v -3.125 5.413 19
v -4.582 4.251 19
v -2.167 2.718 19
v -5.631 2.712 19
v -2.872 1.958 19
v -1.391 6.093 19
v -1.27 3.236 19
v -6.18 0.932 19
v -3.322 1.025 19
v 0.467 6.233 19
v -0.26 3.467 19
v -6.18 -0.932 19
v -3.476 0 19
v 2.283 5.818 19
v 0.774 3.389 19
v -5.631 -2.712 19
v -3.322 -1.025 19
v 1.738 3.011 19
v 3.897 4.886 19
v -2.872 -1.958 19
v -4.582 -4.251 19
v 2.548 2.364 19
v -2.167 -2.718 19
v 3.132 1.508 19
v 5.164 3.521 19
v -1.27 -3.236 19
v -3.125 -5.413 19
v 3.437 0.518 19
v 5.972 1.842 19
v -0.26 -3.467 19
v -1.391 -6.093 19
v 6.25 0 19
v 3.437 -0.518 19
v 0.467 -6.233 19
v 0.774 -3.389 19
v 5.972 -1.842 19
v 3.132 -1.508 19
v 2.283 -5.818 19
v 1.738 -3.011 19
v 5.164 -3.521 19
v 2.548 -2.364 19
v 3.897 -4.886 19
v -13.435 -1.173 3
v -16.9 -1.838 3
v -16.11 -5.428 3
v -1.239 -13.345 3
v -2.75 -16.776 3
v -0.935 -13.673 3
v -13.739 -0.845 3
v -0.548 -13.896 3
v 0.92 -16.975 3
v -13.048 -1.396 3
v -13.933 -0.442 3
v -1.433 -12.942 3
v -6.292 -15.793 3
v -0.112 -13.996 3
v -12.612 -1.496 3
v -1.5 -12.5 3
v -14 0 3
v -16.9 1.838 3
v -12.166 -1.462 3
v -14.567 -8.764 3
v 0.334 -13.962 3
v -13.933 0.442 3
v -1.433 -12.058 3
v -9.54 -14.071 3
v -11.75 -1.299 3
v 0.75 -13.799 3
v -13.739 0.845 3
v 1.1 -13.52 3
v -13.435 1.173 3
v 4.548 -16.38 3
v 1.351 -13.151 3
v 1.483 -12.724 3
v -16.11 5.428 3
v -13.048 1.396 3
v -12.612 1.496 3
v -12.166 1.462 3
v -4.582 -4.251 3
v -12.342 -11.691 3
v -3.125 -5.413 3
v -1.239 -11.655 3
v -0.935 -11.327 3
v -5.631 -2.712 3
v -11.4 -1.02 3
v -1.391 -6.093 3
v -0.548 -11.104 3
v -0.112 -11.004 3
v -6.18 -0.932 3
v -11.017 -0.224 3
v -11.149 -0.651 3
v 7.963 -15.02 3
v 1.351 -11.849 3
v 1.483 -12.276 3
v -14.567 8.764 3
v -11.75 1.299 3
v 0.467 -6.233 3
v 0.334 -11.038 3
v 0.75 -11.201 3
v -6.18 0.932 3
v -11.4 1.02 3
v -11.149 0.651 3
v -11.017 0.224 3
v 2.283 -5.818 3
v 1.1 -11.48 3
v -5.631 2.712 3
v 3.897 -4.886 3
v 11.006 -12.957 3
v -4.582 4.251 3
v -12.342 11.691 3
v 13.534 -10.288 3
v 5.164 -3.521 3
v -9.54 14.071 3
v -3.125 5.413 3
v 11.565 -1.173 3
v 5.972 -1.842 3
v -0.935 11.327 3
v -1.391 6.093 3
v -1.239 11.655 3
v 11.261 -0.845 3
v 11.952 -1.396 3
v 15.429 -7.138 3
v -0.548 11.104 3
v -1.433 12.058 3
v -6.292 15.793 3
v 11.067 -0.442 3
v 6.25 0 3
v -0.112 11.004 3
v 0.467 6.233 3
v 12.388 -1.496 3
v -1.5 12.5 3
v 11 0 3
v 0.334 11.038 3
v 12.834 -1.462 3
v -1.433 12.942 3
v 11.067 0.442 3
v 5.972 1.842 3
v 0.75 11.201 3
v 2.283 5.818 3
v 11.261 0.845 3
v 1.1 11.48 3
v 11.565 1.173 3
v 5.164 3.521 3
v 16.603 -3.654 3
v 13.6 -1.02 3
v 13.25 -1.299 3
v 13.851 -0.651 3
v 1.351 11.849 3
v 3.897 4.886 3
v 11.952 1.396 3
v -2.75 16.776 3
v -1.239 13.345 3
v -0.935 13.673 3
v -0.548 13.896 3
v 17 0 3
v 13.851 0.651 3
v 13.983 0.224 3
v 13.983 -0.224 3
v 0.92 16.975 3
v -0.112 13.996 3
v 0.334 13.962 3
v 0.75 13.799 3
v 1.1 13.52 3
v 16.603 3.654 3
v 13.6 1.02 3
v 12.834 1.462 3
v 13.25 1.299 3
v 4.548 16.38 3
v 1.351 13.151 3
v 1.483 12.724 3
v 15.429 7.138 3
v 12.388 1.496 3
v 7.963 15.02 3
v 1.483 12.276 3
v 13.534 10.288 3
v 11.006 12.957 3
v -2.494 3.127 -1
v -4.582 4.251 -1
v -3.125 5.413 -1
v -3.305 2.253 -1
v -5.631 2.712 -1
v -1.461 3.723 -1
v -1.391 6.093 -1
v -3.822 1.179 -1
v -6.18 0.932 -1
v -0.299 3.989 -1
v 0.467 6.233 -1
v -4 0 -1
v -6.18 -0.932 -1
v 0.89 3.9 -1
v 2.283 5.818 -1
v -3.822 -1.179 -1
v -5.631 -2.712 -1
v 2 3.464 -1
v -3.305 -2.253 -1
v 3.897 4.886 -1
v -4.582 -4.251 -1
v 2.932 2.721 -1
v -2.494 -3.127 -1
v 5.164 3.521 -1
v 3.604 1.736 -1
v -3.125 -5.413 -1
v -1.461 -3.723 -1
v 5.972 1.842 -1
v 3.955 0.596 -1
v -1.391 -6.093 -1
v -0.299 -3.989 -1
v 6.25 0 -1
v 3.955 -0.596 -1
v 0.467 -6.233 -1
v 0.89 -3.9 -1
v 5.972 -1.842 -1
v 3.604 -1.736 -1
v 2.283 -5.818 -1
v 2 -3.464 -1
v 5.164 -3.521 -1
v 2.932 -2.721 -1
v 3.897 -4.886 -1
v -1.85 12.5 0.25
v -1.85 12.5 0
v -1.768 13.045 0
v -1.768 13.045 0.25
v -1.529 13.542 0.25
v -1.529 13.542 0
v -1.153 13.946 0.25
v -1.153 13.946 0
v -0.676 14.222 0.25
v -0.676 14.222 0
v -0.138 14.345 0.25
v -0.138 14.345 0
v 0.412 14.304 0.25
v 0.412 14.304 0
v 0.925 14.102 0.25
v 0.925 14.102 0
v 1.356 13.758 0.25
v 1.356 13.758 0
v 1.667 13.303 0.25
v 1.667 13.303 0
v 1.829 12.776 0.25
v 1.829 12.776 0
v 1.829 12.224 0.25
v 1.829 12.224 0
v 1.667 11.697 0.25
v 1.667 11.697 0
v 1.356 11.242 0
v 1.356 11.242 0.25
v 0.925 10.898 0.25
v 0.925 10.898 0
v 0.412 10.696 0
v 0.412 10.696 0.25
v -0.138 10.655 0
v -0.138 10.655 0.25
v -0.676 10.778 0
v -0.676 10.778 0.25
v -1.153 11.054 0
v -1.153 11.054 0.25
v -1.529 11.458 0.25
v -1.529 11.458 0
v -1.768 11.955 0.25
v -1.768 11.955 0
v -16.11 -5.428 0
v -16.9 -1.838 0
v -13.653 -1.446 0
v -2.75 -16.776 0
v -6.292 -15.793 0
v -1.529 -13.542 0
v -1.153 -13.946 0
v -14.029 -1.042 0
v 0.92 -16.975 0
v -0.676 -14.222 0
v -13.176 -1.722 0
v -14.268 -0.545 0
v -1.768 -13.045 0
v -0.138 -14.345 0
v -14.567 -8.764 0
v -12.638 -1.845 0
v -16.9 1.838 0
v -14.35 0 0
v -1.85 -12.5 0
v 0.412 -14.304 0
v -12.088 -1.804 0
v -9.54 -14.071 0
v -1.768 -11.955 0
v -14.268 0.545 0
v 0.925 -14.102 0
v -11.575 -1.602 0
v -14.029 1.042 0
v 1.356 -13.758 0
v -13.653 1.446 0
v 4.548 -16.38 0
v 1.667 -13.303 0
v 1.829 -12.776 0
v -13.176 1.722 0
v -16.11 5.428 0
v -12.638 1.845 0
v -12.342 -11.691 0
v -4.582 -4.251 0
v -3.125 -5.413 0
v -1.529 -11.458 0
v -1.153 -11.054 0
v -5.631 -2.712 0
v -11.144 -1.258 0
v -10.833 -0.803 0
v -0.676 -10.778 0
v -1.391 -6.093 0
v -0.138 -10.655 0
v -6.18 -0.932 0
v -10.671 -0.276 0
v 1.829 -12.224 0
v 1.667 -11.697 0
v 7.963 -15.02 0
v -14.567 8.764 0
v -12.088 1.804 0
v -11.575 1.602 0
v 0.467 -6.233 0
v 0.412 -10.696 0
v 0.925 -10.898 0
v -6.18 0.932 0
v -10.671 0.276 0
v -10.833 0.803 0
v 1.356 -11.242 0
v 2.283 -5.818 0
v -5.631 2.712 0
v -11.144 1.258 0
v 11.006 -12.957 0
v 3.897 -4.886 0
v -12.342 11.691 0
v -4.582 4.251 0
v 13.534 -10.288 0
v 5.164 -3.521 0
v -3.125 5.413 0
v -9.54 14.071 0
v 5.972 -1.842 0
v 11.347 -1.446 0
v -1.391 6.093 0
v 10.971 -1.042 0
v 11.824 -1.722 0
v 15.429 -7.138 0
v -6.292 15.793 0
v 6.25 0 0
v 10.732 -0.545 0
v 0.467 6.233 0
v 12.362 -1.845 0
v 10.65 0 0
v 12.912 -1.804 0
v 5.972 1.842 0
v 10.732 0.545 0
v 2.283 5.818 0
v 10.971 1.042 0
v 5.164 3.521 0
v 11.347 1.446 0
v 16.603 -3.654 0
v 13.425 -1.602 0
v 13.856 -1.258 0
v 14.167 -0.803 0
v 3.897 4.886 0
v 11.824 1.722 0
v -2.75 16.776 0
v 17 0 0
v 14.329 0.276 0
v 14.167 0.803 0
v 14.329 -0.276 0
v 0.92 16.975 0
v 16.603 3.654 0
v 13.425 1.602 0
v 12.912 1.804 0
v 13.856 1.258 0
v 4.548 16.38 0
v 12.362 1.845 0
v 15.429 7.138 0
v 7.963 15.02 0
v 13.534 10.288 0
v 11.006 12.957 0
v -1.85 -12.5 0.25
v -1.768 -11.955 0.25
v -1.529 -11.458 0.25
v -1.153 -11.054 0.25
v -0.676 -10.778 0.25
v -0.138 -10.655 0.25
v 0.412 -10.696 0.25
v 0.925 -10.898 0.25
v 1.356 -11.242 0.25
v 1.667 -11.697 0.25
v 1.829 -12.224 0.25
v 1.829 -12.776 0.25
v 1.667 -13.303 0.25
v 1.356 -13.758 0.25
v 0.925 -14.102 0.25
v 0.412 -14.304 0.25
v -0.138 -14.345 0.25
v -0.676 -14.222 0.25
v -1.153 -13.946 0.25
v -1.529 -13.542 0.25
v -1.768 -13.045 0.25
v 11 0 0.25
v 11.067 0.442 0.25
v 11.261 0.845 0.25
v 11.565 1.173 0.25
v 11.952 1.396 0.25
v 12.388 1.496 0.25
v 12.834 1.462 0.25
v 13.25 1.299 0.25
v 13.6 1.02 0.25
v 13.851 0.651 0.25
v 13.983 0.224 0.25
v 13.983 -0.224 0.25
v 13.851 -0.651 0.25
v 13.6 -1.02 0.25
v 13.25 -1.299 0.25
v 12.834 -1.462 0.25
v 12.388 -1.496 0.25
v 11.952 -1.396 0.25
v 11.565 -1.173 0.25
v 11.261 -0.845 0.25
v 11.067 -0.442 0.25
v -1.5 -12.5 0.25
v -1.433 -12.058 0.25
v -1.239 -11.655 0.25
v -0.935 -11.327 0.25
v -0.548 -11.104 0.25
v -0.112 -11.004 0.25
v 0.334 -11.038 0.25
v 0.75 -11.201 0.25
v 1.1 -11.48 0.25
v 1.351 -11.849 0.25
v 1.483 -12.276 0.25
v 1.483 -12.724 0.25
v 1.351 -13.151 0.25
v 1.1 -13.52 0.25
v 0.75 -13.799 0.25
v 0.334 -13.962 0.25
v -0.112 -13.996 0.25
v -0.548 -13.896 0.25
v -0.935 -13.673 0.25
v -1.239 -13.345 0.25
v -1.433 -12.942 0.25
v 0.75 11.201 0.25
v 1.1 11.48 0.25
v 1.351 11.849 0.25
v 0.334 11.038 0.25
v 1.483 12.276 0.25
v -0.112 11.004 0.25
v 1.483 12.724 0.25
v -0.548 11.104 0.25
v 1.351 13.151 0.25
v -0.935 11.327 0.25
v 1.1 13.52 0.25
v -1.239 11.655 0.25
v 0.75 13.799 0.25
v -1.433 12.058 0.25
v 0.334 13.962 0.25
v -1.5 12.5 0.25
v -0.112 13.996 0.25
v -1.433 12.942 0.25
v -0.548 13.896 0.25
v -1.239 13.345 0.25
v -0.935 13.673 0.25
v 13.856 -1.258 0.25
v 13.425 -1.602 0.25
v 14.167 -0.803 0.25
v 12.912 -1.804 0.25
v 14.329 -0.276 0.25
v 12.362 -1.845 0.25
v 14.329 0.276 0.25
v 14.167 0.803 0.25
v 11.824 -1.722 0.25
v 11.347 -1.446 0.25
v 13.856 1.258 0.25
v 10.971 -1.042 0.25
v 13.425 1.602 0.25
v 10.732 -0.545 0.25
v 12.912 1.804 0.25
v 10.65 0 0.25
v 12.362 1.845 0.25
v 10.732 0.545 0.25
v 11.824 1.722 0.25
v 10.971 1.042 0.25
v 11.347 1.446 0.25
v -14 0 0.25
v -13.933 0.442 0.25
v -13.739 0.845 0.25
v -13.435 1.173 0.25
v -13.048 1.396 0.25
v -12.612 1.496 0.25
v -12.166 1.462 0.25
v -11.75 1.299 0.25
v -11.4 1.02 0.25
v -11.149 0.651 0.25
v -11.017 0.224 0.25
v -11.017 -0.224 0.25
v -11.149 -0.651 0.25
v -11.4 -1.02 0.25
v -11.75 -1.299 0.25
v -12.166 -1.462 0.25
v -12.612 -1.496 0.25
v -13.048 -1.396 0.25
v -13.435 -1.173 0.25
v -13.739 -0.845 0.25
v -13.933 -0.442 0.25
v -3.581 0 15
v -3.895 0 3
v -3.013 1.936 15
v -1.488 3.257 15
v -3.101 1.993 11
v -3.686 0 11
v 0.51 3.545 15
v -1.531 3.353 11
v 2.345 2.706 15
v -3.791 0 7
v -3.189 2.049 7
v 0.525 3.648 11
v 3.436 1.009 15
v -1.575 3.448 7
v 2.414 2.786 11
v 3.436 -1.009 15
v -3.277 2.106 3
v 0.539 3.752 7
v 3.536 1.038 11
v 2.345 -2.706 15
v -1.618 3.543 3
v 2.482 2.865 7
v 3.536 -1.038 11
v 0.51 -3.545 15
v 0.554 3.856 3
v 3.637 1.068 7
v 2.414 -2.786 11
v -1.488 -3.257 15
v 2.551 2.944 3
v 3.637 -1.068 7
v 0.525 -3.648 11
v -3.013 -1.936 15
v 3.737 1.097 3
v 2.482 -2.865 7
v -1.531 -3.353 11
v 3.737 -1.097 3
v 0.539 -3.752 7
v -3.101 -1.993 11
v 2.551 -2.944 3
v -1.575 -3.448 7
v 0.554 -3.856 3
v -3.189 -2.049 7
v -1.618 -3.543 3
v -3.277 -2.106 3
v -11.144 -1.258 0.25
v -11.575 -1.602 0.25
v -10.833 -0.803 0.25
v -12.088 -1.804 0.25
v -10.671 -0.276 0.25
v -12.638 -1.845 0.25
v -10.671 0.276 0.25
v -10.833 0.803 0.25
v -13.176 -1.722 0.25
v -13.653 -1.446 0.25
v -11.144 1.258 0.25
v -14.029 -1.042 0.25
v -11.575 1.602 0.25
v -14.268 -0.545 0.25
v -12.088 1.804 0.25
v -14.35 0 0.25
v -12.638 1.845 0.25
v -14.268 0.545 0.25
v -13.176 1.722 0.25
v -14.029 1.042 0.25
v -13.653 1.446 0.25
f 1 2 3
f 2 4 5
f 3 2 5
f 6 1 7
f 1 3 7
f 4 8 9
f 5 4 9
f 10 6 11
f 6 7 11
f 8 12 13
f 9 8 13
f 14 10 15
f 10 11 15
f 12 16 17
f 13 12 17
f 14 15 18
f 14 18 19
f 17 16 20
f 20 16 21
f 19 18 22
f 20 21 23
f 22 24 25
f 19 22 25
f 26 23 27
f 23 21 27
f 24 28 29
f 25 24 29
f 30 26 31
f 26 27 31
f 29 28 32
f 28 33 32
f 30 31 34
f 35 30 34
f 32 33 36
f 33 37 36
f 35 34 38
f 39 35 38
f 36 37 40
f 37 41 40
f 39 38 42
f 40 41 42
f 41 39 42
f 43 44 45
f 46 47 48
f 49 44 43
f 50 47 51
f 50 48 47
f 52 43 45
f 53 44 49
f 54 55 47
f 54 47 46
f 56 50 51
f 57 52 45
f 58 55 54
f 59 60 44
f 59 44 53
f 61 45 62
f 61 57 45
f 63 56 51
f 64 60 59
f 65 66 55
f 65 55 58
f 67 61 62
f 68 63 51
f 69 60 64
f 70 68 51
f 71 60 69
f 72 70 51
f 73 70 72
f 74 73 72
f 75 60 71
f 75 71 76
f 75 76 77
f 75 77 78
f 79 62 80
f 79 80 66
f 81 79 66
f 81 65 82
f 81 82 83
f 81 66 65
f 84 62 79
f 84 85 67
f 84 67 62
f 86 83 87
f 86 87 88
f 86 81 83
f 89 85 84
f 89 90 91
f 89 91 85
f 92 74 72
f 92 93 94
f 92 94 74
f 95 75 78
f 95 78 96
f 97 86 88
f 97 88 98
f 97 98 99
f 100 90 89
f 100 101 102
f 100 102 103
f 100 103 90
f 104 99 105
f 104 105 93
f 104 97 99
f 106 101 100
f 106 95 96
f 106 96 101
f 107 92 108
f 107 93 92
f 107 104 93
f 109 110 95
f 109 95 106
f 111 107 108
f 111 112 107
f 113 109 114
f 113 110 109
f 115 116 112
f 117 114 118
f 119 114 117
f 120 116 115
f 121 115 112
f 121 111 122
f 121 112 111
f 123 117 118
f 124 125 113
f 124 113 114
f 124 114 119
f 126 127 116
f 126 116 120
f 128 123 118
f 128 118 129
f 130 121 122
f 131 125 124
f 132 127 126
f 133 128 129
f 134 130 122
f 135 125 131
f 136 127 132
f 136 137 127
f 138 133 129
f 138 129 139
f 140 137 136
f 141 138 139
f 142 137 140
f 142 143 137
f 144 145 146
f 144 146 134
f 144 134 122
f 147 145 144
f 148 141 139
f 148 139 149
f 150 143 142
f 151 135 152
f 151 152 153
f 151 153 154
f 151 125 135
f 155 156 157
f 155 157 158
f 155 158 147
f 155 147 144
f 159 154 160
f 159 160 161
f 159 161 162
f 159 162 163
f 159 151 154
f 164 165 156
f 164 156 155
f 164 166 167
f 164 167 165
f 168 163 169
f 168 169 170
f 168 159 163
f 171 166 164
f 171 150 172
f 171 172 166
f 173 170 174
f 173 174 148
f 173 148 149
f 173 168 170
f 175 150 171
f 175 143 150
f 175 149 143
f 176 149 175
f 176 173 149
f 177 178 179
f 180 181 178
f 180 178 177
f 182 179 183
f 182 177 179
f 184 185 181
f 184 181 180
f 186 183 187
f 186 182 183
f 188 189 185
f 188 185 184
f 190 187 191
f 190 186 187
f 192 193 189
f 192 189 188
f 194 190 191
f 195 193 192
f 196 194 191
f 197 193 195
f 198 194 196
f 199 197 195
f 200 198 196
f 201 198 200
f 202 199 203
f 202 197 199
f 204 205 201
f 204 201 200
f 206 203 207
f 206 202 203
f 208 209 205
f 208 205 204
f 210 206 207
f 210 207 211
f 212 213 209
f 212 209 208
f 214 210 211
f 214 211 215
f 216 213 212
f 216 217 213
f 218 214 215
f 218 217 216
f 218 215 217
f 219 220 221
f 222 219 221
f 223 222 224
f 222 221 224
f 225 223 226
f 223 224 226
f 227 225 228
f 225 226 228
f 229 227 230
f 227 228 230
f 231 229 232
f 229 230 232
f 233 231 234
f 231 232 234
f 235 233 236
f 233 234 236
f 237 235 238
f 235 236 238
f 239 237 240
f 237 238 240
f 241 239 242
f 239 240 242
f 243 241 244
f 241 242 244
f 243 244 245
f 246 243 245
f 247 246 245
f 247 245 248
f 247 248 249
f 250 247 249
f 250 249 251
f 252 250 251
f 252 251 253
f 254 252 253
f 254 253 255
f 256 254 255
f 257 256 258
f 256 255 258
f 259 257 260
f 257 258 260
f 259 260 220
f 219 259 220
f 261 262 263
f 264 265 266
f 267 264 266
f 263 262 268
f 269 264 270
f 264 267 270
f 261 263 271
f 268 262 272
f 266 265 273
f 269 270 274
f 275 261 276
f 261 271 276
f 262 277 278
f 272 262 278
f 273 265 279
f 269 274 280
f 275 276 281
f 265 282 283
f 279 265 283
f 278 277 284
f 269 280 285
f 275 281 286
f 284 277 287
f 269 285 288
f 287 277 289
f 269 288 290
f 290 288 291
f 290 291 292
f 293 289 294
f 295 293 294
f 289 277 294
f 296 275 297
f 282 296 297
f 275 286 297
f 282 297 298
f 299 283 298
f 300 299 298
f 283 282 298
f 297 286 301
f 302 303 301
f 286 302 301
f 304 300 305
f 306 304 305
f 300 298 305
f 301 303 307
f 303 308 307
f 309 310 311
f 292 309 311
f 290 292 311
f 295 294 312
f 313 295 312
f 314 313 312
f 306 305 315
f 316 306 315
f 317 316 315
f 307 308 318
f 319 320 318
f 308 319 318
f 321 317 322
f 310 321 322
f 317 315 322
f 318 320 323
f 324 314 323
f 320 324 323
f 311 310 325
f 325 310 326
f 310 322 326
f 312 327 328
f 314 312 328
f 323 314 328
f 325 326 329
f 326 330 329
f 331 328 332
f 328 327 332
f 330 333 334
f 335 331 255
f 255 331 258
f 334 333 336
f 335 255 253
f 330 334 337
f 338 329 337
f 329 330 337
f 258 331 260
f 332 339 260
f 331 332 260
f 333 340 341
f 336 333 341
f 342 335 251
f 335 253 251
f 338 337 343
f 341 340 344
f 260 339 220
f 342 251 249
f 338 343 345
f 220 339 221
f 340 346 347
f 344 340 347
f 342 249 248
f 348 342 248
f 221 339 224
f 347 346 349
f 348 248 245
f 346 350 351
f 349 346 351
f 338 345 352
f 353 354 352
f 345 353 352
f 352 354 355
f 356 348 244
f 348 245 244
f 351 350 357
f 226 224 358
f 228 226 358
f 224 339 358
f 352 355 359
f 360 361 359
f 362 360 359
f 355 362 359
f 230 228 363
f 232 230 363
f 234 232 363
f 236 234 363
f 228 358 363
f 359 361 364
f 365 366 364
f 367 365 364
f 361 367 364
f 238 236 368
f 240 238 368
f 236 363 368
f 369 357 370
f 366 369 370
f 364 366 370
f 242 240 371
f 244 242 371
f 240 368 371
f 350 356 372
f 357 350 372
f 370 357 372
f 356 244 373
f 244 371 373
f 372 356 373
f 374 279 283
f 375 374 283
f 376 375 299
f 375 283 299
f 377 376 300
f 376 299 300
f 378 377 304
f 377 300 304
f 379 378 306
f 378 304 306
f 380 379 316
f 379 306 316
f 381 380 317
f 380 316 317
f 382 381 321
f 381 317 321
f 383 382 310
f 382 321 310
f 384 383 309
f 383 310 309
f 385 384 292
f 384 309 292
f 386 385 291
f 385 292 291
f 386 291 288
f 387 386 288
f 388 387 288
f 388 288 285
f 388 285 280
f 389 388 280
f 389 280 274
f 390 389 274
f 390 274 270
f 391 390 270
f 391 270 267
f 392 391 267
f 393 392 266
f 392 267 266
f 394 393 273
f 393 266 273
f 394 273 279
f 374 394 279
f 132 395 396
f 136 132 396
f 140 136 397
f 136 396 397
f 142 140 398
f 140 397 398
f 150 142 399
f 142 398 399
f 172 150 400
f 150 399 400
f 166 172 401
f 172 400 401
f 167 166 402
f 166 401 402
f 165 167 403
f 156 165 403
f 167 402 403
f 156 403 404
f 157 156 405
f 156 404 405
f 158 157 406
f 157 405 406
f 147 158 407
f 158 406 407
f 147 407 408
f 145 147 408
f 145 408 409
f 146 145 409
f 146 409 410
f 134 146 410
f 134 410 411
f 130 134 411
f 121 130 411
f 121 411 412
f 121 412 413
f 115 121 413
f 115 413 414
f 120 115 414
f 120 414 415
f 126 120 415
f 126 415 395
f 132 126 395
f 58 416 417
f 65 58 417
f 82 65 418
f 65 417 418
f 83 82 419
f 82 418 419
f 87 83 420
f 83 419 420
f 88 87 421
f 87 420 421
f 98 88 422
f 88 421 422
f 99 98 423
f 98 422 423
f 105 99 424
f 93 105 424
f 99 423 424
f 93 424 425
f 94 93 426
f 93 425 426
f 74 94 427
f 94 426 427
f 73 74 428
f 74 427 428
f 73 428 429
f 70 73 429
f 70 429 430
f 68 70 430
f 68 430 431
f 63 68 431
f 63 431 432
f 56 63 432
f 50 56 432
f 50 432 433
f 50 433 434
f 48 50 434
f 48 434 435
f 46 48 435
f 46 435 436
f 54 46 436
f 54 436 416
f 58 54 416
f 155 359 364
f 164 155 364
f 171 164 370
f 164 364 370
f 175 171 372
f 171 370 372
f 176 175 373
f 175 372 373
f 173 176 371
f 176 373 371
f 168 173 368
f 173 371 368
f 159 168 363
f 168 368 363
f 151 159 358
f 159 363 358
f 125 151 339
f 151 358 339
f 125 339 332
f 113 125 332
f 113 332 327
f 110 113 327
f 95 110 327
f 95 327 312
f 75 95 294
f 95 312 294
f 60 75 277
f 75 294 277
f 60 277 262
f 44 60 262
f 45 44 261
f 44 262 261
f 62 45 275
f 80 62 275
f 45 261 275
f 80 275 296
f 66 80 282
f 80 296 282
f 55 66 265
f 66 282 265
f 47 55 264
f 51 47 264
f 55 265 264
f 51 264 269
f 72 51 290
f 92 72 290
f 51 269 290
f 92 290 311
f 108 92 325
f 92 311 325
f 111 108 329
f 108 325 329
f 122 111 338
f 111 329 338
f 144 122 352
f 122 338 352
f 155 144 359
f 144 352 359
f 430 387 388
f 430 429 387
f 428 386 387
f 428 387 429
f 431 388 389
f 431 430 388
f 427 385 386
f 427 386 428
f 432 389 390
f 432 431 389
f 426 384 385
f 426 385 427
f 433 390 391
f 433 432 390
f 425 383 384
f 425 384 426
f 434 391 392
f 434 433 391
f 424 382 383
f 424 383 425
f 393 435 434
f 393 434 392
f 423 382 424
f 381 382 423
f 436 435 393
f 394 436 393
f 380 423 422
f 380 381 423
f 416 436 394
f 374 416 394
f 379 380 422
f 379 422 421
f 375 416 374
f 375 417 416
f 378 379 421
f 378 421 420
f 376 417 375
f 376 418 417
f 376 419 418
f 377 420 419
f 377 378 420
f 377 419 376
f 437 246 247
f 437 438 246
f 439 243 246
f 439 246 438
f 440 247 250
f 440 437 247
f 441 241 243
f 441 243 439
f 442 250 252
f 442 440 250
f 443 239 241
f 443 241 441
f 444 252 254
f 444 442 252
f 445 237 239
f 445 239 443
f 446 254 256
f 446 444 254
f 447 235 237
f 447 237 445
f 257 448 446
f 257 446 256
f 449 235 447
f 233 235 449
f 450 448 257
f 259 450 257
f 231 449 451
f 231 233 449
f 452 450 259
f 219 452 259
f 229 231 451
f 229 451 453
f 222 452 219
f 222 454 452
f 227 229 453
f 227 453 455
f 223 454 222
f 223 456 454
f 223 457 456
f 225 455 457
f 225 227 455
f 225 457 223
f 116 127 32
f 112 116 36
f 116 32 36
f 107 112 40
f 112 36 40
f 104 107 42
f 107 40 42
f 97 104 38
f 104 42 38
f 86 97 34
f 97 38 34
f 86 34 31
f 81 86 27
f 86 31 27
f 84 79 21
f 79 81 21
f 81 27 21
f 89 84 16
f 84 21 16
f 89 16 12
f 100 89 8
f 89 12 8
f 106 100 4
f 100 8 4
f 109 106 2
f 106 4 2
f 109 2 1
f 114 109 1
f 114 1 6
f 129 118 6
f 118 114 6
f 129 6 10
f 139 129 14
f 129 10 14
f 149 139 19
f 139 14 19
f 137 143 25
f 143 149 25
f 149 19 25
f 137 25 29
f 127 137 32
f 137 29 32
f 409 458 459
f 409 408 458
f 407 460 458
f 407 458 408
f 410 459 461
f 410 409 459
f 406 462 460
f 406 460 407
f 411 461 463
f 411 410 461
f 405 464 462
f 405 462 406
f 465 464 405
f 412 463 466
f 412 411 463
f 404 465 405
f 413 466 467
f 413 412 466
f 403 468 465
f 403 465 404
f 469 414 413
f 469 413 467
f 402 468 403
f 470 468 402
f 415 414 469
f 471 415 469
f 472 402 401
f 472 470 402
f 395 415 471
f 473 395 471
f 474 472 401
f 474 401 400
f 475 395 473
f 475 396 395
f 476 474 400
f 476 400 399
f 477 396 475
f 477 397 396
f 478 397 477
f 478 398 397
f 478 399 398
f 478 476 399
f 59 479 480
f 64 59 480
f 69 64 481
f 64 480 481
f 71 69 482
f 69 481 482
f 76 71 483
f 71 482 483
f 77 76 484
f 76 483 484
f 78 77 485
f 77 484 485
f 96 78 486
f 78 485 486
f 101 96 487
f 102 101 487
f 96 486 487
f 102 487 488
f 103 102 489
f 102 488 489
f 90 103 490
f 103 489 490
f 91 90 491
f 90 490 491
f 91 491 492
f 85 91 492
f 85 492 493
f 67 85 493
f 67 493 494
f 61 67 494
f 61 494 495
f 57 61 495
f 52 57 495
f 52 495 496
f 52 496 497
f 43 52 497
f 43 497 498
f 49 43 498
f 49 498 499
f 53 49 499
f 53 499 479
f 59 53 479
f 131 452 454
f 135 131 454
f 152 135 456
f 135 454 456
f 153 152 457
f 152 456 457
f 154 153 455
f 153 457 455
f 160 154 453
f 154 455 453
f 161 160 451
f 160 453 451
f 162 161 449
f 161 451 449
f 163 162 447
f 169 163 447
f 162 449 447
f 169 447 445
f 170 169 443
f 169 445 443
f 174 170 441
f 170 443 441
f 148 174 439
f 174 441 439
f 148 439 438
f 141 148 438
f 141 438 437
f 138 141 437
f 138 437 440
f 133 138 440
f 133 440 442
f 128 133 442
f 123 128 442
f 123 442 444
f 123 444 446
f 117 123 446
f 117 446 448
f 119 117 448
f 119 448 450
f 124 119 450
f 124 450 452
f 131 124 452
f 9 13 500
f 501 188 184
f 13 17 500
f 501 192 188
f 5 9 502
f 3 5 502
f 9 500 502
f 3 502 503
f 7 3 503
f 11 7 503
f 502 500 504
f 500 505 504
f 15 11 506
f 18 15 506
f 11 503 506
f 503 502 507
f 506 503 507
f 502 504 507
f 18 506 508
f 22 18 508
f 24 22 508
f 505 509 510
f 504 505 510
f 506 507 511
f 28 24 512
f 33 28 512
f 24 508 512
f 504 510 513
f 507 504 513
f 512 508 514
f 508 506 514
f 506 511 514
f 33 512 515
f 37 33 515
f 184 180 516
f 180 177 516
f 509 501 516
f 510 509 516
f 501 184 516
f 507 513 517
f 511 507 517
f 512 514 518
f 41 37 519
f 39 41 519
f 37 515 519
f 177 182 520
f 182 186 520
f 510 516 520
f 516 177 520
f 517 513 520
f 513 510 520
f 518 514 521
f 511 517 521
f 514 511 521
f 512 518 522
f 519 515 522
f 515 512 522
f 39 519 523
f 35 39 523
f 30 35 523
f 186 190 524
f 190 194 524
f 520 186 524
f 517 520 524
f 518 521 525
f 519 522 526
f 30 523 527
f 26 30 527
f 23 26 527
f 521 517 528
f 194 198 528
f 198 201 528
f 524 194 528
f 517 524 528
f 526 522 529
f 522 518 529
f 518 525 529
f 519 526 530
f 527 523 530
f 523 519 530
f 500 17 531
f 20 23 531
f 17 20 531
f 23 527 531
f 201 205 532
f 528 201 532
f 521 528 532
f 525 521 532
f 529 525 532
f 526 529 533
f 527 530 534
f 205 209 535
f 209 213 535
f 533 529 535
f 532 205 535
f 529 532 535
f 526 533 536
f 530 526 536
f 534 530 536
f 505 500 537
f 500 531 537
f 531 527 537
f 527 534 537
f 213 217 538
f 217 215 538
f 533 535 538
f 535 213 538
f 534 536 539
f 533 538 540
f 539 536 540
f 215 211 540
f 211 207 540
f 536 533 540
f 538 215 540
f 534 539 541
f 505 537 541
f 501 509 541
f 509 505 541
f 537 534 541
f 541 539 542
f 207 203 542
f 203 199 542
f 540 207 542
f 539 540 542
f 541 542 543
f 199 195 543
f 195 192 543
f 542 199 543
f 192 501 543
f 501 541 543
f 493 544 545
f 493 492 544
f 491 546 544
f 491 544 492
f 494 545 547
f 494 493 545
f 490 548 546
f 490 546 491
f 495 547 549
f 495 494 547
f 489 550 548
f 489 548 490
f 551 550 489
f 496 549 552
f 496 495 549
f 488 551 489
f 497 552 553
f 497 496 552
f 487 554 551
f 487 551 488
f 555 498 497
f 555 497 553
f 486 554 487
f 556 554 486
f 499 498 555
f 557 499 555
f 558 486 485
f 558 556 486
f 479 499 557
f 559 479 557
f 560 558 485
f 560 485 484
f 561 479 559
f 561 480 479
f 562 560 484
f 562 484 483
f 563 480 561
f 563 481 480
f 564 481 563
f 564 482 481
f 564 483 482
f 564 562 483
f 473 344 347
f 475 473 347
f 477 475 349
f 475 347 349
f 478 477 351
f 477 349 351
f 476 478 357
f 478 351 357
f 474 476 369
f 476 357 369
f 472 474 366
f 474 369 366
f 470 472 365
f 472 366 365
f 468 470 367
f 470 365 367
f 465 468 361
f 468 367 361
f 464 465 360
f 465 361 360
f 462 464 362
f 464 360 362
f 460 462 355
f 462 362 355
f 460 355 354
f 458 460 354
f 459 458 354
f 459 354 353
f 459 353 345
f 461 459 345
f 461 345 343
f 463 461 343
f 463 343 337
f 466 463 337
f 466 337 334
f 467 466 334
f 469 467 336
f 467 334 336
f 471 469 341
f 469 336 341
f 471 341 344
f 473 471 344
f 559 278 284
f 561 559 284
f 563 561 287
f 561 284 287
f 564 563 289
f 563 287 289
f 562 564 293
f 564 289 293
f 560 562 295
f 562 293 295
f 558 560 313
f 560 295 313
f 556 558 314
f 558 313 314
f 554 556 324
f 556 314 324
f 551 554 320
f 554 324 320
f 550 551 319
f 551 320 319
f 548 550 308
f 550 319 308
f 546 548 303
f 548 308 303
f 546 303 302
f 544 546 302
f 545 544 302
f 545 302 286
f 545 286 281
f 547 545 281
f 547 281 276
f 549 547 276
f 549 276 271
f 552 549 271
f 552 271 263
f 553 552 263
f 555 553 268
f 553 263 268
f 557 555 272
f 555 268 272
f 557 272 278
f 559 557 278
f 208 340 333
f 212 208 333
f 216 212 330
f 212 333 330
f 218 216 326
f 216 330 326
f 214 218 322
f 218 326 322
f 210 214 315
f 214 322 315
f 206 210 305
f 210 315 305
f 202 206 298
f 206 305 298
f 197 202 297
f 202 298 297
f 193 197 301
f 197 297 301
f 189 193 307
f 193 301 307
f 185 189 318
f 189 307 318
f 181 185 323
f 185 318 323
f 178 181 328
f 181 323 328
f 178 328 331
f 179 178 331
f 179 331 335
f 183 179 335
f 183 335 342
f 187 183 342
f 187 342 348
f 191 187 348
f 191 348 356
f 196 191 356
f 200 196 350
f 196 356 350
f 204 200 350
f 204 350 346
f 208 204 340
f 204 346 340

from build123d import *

# Parameters (mm, degrees)
SKETCH1_R           = 17
BOSS_EXTRUDE1_DEPTH = 3
SKETCH2_R           = 1.5
CUT_EXTRUDE1_DEPTH  = 25.228082879
SKETCH3_R           = 6.25
BOSS_EXTRUDE2_DEPTH = 1
BOSS_EXTRUDE3_START = -20
SKETCH5_R           = 6.25
BOSS_EXTRUDE3_DEPTH = 20
SKETCH6_R           = 4
CUT_EXTRUDE2_DEPTH  = 32.272991542
CUT_EXTRUDE2_DRAFT  = -1.5
SKETCH7_R           = 1.85
SKETCH7_R_2         = 1.5
CUT_EXTRUDE3_DEPTH  = 0.25


with BuildPart() as part:
    # Sketch1 → Boss-Extrude1 (new body)
    with BuildSketch(Plane.XY):
        Circle(SKETCH1_R)
    extrude(amount=BOSS_EXTRUDE1_DEPTH)

    # Sketch2 → Cut-Extrude1 (cut, through all)
    with BuildSketch(Plane(origin=(0, 0, 0), x_dir=(-1, 0, 0), z_dir=(0, 0, -1))):
        with Locations((0, 12.5)):
            Circle(SKETCH2_R)
        with Locations((12.5, 0)):
            Circle(SKETCH2_R)
        with Locations((0, -12.5)):
            Circle(SKETCH2_R)
        with Locations((-12.5, 0)):
            Circle(SKETCH2_R)
    extrude(amount=-CUT_EXTRUDE1_DEPTH, mode=Mode.SUBTRACT)

    # Sketch3 → Boss-Extrude2 (add)
    with BuildSketch(Plane(origin=(0, 0, 0), x_dir=(-1, 0, 0), z_dir=(0, 0, -1))):
        with Locations(Location((0, 0, 0), (0, 0, 180))):
            Circle(SKETCH3_R)
    extrude(amount=BOSS_EXTRUDE2_DEPTH)

    # Sketch5 → Boss-Extrude3 (add)
    with BuildSketch(Plane(origin=(0, 0, -1), x_dir=(-1, 0, 0), z_dir=(0, 0, -1)).offset(BOSS_EXTRUDE3_START)):
        with Locations(Location((0, 0, 0), (0, 0, 180))):
            Circle(SKETCH5_R)
    extrude(amount=BOSS_EXTRUDE3_DEPTH)


with BuildPart() as cut_extrude2_tool:
    # Sketch6 → Cut-Extrude2 (with draft: the straight prism first)
    with BuildSketch(Plane(origin=(0, 0, -1), x_dir=(-1, 0, 0), z_dir=(0, 0, -1))):
        Circle(SKETCH6_R)
    extrude(amount=-CUT_EXTRUDE2_DEPTH)
    # Cut-Extrude2: the draft: its side faces are tilted about the plane it starts from
    cut_extrude2_sides = [cut_extrude2_tool.faces().sort_by_distance(p)[0] for p in [
        (4, 0, 15.136495771),
    ]]
    draft(cut_extrude2_sides, Plane(origin=(0, 0, -1), x_dir=(-1, 0, 0), z_dir=(0, 0, -1)), CUT_EXTRUDE2_DRAFT)


with BuildPart() as part_1:
    add(part.part)

    # Cut-Extrude2: cut by cut_extrude2_tool
    add(cut_extrude2_tool.part, mode=Mode.SUBTRACT)

    # Sketch7 → Cut-Extrude3 (cut)
    # profile 1 of 4: a face of its own
    with BuildSketch(Plane(origin=(0, 0, 0), x_dir=(-1, 0, 0), z_dir=(0, 0, -1))):
        with Locations((0, 12.5)):
            Circle(SKETCH7_R)
        with Locations((0, 12.5)):
            Circle(SKETCH7_R_2, mode=Mode.SUBTRACT)
    # profile 2 of 4: a face of its own
    with BuildSketch(Plane(origin=(0, 0, 0), x_dir=(-1, 0, 0), z_dir=(0, 0, -1))):
        with Locations((12.5, 0)):
            Circle(SKETCH7_R)
        with Locations((12.5, 0)):
            Circle(SKETCH7_R_2, mode=Mode.SUBTRACT)
    # profile 3 of 4: a face of its own
    with BuildSketch(Plane(origin=(0, 0, 0), x_dir=(-1, 0, 0), z_dir=(0, 0, -1))):
        with Locations((0, -12.5)):
            Circle(SKETCH7_R)
        with Locations((0, -12.5)):
            Circle(SKETCH7_R_2, mode=Mode.SUBTRACT)
    # profile 4 of 4: a face of its own
    with BuildSketch(Plane(origin=(0, 0, 0), x_dir=(-1, 0, 0), z_dir=(0, 0, -1))):
        with Locations((-12.5, 0)):
            Circle(SKETCH7_R)
        with Locations((-12.5, 0)):
            Circle(SKETCH7_R_2, mode=Mode.SUBTRACT)
    extrude(amount=-CUT_EXTRUDE3_DEPTH, mode=Mode.SUBTRACT)


solid = part_1.part
